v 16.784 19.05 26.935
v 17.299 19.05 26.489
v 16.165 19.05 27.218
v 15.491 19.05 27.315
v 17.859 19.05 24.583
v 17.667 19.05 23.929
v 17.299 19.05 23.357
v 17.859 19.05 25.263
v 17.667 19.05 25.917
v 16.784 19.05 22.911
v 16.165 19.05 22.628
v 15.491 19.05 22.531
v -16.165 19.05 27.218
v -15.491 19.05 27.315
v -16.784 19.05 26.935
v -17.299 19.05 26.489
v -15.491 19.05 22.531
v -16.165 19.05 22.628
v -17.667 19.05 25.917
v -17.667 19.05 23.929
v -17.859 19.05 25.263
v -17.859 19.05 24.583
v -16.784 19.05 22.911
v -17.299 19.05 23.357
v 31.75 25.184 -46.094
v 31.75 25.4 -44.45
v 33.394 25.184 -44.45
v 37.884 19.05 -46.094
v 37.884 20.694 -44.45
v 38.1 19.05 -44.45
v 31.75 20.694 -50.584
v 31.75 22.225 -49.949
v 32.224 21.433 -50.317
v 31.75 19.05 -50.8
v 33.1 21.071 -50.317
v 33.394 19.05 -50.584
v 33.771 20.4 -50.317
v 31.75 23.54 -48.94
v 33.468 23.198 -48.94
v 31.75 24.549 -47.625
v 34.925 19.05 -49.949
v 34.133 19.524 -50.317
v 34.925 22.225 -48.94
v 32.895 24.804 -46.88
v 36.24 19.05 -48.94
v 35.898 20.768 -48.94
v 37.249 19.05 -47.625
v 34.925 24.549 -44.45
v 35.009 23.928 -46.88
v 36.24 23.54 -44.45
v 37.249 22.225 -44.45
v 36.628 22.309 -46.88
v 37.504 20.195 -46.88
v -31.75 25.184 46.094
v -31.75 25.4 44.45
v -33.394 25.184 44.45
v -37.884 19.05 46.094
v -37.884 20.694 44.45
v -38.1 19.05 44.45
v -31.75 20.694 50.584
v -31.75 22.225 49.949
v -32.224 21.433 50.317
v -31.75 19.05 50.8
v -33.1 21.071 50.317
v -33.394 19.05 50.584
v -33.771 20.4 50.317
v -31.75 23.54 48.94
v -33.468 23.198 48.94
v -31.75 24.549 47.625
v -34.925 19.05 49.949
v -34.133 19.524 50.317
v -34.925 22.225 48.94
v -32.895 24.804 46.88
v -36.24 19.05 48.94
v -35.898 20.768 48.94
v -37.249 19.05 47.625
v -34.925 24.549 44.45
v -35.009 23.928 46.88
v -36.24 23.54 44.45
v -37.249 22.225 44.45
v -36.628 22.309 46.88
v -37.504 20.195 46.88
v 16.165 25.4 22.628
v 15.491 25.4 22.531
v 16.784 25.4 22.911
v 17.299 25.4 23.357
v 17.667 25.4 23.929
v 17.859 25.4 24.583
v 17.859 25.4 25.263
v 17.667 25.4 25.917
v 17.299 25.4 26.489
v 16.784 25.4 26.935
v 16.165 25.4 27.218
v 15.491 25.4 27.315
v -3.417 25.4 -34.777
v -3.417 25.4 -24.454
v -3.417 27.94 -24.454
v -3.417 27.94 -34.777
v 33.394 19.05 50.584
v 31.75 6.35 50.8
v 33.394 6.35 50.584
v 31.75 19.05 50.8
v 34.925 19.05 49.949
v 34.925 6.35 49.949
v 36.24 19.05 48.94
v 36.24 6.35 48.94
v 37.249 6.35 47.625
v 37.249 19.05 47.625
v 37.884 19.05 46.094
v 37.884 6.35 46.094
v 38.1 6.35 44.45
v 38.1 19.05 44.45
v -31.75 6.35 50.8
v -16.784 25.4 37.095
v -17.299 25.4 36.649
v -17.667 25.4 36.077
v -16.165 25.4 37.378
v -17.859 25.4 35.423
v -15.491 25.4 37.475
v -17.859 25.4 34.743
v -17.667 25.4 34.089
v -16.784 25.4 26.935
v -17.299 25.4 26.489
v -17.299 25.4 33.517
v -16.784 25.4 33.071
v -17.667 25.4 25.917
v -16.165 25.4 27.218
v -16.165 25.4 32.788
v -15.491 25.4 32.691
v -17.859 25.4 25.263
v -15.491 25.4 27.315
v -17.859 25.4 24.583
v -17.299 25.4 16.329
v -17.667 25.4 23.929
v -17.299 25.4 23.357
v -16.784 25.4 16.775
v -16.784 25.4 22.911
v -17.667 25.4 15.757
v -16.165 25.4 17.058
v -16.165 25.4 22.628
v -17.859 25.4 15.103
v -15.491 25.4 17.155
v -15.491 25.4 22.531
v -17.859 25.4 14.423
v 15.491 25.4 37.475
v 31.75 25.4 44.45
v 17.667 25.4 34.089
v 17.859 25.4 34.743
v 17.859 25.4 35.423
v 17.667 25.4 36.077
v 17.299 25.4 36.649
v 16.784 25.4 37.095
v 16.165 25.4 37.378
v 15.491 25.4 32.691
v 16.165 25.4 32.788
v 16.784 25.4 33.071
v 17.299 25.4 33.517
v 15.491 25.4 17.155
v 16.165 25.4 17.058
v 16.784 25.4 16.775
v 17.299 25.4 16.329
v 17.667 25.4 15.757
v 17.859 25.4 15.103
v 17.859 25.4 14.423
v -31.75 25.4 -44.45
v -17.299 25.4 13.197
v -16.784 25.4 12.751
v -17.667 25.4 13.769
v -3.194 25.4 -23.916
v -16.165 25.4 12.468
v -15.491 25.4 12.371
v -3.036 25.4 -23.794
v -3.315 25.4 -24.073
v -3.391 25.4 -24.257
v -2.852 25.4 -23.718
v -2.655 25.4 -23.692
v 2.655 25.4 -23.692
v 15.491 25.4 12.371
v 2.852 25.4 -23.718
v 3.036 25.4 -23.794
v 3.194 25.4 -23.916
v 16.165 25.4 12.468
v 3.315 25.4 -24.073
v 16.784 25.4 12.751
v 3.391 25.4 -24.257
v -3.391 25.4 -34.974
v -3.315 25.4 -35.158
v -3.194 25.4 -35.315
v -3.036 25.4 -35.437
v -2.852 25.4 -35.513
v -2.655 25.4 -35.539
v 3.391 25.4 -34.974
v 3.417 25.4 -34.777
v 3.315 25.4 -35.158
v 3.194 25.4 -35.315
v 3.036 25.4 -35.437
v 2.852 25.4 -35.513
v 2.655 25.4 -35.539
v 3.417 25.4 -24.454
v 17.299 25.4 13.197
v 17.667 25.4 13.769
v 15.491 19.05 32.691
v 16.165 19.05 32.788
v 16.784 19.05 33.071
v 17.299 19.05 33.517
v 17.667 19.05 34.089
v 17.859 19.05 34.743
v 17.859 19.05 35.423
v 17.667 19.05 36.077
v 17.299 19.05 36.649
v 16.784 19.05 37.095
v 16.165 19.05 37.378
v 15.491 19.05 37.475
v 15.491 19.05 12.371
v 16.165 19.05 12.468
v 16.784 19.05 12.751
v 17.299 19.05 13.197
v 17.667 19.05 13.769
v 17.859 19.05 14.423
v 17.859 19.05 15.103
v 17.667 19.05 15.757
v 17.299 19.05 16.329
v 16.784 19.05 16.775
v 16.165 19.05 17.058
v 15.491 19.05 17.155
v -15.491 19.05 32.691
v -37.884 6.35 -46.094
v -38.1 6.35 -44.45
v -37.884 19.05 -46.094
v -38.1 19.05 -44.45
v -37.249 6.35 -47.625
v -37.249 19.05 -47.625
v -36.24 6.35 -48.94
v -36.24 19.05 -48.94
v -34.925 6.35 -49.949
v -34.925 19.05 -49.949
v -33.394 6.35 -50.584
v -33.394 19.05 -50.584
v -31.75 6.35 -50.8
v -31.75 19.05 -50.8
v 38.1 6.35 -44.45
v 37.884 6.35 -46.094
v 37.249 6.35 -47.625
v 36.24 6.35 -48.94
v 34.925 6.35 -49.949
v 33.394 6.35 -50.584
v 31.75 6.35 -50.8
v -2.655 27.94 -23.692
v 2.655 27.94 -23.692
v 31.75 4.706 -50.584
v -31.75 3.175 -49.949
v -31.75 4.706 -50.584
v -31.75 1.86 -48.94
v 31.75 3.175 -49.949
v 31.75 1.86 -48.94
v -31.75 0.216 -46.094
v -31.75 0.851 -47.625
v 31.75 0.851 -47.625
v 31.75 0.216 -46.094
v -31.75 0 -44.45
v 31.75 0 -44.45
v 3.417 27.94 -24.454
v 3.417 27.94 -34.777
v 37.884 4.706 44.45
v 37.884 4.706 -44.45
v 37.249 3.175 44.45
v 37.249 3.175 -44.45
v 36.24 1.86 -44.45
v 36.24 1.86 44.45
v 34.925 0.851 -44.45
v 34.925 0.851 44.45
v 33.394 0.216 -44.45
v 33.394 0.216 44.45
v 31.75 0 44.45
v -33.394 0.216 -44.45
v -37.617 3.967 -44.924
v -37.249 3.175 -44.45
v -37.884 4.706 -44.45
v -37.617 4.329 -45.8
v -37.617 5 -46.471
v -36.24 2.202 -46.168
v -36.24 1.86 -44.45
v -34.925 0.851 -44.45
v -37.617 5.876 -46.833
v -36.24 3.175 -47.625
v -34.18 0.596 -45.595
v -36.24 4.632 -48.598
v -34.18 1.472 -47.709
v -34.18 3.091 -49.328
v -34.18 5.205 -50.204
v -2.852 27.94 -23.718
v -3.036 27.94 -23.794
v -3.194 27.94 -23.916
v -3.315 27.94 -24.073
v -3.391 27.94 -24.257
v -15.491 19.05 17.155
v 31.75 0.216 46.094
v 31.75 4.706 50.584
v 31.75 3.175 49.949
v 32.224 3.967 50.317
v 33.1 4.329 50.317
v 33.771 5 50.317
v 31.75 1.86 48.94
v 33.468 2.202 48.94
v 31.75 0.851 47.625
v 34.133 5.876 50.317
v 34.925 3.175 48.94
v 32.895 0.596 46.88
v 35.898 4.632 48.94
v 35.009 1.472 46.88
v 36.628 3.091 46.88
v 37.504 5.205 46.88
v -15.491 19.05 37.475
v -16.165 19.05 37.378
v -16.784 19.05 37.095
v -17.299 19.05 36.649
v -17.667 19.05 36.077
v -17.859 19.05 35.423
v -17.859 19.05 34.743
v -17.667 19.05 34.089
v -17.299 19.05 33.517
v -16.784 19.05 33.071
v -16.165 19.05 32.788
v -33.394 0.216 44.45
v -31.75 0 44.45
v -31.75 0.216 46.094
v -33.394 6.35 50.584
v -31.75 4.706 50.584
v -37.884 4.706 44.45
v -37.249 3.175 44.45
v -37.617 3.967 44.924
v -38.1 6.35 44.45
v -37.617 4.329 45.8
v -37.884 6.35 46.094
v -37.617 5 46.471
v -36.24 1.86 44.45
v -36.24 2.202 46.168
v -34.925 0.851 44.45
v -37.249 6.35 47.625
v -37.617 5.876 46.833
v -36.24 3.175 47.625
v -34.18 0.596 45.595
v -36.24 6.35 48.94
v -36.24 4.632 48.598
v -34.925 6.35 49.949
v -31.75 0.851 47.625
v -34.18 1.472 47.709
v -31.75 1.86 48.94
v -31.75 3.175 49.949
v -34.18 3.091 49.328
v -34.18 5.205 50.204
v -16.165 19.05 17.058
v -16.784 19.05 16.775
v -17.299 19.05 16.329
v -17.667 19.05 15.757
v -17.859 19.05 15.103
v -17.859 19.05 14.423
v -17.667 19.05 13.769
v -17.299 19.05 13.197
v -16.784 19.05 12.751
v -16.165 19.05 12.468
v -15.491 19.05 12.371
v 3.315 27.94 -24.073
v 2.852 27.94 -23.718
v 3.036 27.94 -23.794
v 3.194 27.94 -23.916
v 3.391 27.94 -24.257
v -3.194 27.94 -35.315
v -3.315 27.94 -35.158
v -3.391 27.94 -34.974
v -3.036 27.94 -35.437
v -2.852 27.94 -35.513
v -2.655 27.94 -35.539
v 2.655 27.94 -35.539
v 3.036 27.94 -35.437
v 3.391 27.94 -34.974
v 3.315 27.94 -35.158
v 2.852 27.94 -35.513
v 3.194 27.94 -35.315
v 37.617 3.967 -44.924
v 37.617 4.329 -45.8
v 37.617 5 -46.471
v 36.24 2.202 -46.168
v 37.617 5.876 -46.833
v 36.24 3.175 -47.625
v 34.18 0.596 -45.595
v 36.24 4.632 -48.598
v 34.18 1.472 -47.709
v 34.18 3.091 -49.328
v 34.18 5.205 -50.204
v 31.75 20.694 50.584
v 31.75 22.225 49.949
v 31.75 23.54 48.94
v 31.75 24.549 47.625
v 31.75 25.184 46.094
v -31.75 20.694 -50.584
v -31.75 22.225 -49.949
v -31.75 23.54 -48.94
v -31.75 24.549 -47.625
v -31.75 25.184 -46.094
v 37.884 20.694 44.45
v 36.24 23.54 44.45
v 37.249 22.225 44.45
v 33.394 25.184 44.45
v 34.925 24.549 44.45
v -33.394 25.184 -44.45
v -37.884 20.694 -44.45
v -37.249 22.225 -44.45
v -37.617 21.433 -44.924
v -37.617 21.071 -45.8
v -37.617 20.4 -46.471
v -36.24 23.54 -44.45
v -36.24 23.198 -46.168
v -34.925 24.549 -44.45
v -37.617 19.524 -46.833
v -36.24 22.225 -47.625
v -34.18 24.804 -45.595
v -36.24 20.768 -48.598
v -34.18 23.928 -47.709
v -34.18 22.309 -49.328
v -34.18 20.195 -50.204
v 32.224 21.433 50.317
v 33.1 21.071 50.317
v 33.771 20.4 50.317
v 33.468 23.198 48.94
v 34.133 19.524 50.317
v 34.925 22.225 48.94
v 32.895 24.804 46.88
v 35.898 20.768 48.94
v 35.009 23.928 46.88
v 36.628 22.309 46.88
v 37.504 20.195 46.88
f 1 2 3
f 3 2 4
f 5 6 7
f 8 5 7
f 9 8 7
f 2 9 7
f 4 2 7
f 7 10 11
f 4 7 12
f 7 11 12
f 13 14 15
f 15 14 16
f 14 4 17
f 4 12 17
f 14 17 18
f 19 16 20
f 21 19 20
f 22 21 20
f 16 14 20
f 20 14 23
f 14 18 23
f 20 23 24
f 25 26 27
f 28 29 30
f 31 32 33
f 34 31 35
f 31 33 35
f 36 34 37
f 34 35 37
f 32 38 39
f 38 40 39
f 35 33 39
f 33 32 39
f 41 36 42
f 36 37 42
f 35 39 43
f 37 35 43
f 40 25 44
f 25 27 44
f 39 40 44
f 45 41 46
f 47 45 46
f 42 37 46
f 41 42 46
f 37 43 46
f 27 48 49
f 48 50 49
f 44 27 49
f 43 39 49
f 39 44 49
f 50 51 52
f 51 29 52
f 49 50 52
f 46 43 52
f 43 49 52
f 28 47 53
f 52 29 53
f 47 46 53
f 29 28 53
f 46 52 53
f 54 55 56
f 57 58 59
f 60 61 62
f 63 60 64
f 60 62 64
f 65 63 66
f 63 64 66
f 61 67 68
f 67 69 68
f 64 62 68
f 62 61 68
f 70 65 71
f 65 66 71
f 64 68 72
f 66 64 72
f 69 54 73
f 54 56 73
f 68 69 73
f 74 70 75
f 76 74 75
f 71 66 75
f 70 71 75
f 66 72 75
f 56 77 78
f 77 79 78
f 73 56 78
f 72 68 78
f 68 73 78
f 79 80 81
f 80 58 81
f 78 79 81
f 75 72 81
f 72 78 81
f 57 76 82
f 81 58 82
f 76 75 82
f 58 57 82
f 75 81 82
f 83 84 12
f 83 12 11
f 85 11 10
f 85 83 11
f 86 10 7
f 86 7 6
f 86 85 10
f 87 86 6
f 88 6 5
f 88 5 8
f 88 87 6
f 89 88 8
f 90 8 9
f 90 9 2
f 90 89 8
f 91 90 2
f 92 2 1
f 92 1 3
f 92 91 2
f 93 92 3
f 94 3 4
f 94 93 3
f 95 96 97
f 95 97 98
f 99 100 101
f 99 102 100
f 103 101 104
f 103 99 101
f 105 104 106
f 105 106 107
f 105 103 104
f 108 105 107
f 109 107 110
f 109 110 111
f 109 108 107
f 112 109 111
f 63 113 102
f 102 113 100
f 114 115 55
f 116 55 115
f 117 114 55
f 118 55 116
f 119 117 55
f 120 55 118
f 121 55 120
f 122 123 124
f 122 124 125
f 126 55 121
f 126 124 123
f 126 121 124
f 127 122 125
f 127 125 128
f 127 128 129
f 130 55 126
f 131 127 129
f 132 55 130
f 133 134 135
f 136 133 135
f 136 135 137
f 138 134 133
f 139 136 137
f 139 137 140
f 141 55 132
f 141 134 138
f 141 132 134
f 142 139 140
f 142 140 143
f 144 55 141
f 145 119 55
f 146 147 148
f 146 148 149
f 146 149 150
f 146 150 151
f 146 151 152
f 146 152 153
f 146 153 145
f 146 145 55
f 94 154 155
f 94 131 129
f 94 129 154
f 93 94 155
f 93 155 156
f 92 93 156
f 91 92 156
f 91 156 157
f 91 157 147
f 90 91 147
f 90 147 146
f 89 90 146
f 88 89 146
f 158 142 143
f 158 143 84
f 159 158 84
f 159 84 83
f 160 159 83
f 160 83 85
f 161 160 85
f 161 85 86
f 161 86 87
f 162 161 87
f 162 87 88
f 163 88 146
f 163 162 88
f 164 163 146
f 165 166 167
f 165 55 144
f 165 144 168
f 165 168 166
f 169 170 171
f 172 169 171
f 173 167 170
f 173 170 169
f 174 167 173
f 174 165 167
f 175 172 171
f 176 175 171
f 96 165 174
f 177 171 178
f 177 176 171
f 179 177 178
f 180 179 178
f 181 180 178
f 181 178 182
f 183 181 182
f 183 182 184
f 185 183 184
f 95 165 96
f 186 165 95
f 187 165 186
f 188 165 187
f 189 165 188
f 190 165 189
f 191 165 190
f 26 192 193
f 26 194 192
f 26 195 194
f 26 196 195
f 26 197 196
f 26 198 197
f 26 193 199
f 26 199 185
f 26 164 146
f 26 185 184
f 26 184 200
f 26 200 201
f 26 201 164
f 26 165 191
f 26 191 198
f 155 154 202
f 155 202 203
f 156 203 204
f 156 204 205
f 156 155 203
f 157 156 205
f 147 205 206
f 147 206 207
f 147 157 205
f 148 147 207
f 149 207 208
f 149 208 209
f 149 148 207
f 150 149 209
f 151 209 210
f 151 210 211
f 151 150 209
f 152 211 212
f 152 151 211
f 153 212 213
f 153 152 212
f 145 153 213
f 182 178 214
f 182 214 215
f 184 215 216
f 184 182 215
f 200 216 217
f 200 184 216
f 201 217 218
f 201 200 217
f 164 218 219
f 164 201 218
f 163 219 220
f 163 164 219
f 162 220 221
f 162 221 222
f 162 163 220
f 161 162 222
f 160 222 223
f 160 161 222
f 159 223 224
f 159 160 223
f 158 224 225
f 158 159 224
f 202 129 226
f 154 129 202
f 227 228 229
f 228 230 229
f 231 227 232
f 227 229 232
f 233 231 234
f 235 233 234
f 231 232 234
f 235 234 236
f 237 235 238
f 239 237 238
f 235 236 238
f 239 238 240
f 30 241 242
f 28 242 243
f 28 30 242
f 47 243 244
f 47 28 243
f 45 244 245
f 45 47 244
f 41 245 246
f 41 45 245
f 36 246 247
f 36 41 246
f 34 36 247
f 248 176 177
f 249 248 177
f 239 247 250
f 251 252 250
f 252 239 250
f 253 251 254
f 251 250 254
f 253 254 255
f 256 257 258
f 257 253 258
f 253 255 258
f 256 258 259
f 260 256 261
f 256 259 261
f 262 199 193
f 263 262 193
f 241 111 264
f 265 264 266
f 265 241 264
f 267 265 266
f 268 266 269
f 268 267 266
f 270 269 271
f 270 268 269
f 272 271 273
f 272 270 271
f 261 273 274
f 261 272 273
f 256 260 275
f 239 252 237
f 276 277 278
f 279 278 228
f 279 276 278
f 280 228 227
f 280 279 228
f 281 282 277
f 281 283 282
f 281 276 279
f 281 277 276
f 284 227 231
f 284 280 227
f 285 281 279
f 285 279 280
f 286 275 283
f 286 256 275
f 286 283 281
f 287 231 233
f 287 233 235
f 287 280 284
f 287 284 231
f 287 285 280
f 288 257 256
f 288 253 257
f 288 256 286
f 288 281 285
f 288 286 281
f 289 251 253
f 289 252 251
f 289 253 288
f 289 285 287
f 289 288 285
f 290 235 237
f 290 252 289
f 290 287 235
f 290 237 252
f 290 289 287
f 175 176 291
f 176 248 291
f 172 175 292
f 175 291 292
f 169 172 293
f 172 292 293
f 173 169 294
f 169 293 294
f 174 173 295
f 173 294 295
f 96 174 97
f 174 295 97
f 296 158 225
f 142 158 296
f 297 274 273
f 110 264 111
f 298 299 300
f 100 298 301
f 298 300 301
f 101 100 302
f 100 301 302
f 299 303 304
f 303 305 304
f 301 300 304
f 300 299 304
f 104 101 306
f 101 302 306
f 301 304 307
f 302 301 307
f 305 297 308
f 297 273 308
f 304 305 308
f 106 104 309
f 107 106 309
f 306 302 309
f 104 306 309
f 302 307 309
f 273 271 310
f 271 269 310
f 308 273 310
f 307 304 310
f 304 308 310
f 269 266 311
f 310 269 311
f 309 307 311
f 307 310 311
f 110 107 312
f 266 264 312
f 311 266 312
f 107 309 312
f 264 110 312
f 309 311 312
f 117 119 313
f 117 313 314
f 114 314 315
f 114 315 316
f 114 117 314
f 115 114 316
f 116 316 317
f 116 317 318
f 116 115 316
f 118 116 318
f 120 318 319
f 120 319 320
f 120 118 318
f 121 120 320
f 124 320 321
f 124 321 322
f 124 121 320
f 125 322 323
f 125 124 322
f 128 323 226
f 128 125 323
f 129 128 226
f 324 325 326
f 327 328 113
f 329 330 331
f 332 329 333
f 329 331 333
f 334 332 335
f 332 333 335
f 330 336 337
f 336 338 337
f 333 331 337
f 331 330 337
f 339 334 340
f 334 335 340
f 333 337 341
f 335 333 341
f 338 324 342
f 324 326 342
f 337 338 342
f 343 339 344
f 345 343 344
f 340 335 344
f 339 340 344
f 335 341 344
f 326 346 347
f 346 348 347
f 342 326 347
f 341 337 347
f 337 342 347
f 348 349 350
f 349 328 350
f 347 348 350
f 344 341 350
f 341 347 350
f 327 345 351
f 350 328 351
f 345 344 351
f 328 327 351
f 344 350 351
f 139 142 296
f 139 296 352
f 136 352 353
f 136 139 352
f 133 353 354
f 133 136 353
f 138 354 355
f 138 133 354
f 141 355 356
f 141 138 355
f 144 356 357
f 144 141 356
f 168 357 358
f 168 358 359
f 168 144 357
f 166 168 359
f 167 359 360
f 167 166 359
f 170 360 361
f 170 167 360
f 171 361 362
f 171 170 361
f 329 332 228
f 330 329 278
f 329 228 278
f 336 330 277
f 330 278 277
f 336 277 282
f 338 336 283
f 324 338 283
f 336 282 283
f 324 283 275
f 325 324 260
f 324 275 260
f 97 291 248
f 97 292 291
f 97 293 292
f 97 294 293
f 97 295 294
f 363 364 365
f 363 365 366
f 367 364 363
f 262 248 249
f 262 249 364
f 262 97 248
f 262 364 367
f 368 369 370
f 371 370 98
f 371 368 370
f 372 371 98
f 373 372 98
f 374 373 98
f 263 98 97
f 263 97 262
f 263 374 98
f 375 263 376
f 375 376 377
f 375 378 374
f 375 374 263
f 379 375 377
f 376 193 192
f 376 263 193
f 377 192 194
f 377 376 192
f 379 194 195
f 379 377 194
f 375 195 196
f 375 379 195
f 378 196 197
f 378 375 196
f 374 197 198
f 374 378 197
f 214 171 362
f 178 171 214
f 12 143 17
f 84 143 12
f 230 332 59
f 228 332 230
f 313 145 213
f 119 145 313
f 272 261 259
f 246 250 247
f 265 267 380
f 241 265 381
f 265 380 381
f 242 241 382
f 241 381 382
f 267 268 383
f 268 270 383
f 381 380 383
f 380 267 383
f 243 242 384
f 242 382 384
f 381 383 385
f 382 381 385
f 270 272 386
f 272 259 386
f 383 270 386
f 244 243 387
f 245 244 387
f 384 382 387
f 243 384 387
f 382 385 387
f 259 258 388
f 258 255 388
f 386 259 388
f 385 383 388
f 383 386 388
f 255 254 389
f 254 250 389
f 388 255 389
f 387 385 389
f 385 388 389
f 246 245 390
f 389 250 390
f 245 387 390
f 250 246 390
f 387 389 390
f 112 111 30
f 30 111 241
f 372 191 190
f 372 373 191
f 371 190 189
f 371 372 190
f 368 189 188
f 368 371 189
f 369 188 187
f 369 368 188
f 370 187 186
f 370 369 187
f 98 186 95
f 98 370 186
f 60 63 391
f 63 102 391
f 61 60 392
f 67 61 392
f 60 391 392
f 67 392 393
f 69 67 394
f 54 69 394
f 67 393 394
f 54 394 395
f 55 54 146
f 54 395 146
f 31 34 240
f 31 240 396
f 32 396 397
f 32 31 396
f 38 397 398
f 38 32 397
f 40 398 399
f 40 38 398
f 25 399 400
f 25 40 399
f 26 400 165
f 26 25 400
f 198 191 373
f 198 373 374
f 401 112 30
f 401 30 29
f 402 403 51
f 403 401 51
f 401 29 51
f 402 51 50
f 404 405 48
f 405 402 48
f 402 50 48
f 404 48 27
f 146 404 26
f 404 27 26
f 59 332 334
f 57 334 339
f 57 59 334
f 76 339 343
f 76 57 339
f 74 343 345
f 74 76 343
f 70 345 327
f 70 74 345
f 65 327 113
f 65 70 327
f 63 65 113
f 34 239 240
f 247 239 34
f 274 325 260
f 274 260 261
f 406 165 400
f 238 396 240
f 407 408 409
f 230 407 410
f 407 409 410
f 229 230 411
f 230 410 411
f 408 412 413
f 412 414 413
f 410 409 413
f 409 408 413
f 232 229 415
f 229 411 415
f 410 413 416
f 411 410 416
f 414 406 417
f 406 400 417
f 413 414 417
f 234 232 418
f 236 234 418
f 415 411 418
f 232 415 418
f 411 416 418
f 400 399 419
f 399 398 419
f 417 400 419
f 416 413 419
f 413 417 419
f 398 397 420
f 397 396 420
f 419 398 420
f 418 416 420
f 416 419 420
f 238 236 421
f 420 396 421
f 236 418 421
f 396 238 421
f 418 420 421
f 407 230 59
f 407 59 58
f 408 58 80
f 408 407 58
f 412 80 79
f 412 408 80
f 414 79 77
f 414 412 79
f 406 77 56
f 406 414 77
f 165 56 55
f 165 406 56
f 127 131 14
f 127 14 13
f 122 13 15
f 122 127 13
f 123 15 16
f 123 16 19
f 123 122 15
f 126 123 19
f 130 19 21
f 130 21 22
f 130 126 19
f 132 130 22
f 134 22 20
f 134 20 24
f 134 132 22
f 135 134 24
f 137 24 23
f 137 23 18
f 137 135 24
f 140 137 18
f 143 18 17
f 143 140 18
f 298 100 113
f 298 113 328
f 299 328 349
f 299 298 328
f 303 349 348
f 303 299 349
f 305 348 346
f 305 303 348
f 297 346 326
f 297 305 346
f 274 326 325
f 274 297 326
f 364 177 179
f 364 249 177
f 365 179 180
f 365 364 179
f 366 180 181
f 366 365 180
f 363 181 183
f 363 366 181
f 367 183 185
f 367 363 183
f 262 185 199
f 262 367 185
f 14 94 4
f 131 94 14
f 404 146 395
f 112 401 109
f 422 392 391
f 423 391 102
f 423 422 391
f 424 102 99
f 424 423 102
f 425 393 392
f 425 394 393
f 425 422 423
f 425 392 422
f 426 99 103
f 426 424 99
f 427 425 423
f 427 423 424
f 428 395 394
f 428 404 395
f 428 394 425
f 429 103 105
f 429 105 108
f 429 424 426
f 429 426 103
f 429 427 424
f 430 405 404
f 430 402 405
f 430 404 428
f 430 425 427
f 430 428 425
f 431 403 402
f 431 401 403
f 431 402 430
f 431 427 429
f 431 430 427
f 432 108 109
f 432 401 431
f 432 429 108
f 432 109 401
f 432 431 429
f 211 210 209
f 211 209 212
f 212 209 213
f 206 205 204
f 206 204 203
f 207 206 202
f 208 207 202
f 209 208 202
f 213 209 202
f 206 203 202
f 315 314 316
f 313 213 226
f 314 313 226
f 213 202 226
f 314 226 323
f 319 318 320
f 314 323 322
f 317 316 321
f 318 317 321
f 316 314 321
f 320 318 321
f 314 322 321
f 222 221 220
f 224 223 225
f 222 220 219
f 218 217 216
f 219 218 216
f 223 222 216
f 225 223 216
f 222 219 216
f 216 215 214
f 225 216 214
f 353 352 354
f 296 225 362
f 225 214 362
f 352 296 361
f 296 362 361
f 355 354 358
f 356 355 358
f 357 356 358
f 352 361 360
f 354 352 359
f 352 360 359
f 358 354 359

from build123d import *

# Parameters (mm, degrees)
SKETCH1_W           = 76.2
SKETCH1_H           = 101.6
BOSS_EXTRUDE1_DEPTH = 25.4
FILLET1_R           = 6.35
CUT_EXTRUDE1_DEPTH  = 6.35
SKETCH4_W           = 6.834349176
SKETCH4_H           = 11.846205237
BOSS_EXTRUDE2_DEPTH = 2.54
FILLET2_R           = 0.762


with BuildPart() as part:
    # Sketch1 → Boss-Extrude1 (new body)
    with BuildSketch(Plane(origin=(0, 0, 0), x_dir=(1, 0, 0), z_dir=(0, 1, 0))):
        Rectangle(SKETCH1_W, SKETCH1_H)
    extrude(amount=BOSS_EXTRUDE1_DEPTH)

    # Fillet1
    fillet1_edges = [part.edges().sort_by_distance(p)[0] for p in [
        (38.1, 25.4, 0),
        (0, 25.4, -50.8),
        (-38.1, 25.4, 0),
        (0, 0, -50.8),
        (38.1, 0, 0),
        (0, 0, 50.8),
        (-38.1, 0, 0),
        (0, 25.4, 50.8),
        (-38.1, 12.7, -50.8),
        (38.1, 12.7, -50.8),
        (38.1, 12.7, 50.8),
        (-38.1, 12.7, 50.8),
    ]]
    fillet(fillet1_edges, radius=FILLET1_R)

    # Sketch3 → Cut-Extrude1 (cut)
    with BuildSketch(Plane(origin=(0, 25.4, 0), x_dir=(1, 0, 0), z_dir=(0, 1, 0))):
        with BuildLine():
            Line((15.491191464, -37.475014645), (-15.491191464, -37.475014645))
            ThreePointArc((-15.491191464, -37.475014645), (-17.883213675, -35.082992433), (-15.491191464, -32.690970222))
            Line((-15.491191464, -32.690970222), (15.491191464, -32.690970222))
            ThreePointArc((15.491191464, -32.690970222), (17.883213675, -35.082992433), (15.491191464, -37.475014645))
        make_face()
        with BuildLine():
            Line((15.491191464, -27.315014645), (-15.491191464, -27.315014645))
            ThreePointArc((-15.491191464, -27.315014645), (-17.883213675, -24.922992433), (-15.491191464, -22.530970222))
            Line((-15.491191464, -22.530970222), (15.491191464, -22.530970222))
            ThreePointArc((15.491191464, -22.530970222), (17.883213675, -24.922992433), (15.491191464, -27.315014645))
        make_face()
        with BuildLine():
            Line((15.491191464, -17.155014645), (-15.491191464, -17.155014645))
            ThreePointArc((-15.491191464, -17.155014645), (-17.883213675, -14.762992433), (-15.491191464, -12.370970222))
            Line((-15.491191464, -12.370970222), (15.491191464, -12.370970222))
            ThreePointArc((15.491191464, -12.370970222), (17.883213675, -14.762992433), (15.491191464, -17.155014645))
        make_face()
    extrude(amount=-CUT_EXTRUDE1_DEPTH, mode=Mode.SUBTRACT)

    # Sketch4 → Boss-Extrude2 (add)
    with BuildSketch(Plane(origin=(0, 25.4, 0), x_dir=(1, 0, 0), z_dir=(0, 1, 0))):
        with Locations((0, 29.615513094)):
            Rectangle(SKETCH4_W, SKETCH4_H)
    extrude(amount=BOSS_EXTRUDE2_DEPTH)

    # Fillet2
    fillet2_edges = [part.edges().sort_by_distance(p)[0] for p in [
        (-3.417174588, 26.67, -35.538615712),
        (-3.417174588, 26.67, -23.692410475),
        (3.417174588, 26.67, -23.692410475),
        (3.417174588, 26.67, -35.538615712),
    ]]
    fillet(fillet2_edges, radius=FILLET2_R)


solid = part.part
